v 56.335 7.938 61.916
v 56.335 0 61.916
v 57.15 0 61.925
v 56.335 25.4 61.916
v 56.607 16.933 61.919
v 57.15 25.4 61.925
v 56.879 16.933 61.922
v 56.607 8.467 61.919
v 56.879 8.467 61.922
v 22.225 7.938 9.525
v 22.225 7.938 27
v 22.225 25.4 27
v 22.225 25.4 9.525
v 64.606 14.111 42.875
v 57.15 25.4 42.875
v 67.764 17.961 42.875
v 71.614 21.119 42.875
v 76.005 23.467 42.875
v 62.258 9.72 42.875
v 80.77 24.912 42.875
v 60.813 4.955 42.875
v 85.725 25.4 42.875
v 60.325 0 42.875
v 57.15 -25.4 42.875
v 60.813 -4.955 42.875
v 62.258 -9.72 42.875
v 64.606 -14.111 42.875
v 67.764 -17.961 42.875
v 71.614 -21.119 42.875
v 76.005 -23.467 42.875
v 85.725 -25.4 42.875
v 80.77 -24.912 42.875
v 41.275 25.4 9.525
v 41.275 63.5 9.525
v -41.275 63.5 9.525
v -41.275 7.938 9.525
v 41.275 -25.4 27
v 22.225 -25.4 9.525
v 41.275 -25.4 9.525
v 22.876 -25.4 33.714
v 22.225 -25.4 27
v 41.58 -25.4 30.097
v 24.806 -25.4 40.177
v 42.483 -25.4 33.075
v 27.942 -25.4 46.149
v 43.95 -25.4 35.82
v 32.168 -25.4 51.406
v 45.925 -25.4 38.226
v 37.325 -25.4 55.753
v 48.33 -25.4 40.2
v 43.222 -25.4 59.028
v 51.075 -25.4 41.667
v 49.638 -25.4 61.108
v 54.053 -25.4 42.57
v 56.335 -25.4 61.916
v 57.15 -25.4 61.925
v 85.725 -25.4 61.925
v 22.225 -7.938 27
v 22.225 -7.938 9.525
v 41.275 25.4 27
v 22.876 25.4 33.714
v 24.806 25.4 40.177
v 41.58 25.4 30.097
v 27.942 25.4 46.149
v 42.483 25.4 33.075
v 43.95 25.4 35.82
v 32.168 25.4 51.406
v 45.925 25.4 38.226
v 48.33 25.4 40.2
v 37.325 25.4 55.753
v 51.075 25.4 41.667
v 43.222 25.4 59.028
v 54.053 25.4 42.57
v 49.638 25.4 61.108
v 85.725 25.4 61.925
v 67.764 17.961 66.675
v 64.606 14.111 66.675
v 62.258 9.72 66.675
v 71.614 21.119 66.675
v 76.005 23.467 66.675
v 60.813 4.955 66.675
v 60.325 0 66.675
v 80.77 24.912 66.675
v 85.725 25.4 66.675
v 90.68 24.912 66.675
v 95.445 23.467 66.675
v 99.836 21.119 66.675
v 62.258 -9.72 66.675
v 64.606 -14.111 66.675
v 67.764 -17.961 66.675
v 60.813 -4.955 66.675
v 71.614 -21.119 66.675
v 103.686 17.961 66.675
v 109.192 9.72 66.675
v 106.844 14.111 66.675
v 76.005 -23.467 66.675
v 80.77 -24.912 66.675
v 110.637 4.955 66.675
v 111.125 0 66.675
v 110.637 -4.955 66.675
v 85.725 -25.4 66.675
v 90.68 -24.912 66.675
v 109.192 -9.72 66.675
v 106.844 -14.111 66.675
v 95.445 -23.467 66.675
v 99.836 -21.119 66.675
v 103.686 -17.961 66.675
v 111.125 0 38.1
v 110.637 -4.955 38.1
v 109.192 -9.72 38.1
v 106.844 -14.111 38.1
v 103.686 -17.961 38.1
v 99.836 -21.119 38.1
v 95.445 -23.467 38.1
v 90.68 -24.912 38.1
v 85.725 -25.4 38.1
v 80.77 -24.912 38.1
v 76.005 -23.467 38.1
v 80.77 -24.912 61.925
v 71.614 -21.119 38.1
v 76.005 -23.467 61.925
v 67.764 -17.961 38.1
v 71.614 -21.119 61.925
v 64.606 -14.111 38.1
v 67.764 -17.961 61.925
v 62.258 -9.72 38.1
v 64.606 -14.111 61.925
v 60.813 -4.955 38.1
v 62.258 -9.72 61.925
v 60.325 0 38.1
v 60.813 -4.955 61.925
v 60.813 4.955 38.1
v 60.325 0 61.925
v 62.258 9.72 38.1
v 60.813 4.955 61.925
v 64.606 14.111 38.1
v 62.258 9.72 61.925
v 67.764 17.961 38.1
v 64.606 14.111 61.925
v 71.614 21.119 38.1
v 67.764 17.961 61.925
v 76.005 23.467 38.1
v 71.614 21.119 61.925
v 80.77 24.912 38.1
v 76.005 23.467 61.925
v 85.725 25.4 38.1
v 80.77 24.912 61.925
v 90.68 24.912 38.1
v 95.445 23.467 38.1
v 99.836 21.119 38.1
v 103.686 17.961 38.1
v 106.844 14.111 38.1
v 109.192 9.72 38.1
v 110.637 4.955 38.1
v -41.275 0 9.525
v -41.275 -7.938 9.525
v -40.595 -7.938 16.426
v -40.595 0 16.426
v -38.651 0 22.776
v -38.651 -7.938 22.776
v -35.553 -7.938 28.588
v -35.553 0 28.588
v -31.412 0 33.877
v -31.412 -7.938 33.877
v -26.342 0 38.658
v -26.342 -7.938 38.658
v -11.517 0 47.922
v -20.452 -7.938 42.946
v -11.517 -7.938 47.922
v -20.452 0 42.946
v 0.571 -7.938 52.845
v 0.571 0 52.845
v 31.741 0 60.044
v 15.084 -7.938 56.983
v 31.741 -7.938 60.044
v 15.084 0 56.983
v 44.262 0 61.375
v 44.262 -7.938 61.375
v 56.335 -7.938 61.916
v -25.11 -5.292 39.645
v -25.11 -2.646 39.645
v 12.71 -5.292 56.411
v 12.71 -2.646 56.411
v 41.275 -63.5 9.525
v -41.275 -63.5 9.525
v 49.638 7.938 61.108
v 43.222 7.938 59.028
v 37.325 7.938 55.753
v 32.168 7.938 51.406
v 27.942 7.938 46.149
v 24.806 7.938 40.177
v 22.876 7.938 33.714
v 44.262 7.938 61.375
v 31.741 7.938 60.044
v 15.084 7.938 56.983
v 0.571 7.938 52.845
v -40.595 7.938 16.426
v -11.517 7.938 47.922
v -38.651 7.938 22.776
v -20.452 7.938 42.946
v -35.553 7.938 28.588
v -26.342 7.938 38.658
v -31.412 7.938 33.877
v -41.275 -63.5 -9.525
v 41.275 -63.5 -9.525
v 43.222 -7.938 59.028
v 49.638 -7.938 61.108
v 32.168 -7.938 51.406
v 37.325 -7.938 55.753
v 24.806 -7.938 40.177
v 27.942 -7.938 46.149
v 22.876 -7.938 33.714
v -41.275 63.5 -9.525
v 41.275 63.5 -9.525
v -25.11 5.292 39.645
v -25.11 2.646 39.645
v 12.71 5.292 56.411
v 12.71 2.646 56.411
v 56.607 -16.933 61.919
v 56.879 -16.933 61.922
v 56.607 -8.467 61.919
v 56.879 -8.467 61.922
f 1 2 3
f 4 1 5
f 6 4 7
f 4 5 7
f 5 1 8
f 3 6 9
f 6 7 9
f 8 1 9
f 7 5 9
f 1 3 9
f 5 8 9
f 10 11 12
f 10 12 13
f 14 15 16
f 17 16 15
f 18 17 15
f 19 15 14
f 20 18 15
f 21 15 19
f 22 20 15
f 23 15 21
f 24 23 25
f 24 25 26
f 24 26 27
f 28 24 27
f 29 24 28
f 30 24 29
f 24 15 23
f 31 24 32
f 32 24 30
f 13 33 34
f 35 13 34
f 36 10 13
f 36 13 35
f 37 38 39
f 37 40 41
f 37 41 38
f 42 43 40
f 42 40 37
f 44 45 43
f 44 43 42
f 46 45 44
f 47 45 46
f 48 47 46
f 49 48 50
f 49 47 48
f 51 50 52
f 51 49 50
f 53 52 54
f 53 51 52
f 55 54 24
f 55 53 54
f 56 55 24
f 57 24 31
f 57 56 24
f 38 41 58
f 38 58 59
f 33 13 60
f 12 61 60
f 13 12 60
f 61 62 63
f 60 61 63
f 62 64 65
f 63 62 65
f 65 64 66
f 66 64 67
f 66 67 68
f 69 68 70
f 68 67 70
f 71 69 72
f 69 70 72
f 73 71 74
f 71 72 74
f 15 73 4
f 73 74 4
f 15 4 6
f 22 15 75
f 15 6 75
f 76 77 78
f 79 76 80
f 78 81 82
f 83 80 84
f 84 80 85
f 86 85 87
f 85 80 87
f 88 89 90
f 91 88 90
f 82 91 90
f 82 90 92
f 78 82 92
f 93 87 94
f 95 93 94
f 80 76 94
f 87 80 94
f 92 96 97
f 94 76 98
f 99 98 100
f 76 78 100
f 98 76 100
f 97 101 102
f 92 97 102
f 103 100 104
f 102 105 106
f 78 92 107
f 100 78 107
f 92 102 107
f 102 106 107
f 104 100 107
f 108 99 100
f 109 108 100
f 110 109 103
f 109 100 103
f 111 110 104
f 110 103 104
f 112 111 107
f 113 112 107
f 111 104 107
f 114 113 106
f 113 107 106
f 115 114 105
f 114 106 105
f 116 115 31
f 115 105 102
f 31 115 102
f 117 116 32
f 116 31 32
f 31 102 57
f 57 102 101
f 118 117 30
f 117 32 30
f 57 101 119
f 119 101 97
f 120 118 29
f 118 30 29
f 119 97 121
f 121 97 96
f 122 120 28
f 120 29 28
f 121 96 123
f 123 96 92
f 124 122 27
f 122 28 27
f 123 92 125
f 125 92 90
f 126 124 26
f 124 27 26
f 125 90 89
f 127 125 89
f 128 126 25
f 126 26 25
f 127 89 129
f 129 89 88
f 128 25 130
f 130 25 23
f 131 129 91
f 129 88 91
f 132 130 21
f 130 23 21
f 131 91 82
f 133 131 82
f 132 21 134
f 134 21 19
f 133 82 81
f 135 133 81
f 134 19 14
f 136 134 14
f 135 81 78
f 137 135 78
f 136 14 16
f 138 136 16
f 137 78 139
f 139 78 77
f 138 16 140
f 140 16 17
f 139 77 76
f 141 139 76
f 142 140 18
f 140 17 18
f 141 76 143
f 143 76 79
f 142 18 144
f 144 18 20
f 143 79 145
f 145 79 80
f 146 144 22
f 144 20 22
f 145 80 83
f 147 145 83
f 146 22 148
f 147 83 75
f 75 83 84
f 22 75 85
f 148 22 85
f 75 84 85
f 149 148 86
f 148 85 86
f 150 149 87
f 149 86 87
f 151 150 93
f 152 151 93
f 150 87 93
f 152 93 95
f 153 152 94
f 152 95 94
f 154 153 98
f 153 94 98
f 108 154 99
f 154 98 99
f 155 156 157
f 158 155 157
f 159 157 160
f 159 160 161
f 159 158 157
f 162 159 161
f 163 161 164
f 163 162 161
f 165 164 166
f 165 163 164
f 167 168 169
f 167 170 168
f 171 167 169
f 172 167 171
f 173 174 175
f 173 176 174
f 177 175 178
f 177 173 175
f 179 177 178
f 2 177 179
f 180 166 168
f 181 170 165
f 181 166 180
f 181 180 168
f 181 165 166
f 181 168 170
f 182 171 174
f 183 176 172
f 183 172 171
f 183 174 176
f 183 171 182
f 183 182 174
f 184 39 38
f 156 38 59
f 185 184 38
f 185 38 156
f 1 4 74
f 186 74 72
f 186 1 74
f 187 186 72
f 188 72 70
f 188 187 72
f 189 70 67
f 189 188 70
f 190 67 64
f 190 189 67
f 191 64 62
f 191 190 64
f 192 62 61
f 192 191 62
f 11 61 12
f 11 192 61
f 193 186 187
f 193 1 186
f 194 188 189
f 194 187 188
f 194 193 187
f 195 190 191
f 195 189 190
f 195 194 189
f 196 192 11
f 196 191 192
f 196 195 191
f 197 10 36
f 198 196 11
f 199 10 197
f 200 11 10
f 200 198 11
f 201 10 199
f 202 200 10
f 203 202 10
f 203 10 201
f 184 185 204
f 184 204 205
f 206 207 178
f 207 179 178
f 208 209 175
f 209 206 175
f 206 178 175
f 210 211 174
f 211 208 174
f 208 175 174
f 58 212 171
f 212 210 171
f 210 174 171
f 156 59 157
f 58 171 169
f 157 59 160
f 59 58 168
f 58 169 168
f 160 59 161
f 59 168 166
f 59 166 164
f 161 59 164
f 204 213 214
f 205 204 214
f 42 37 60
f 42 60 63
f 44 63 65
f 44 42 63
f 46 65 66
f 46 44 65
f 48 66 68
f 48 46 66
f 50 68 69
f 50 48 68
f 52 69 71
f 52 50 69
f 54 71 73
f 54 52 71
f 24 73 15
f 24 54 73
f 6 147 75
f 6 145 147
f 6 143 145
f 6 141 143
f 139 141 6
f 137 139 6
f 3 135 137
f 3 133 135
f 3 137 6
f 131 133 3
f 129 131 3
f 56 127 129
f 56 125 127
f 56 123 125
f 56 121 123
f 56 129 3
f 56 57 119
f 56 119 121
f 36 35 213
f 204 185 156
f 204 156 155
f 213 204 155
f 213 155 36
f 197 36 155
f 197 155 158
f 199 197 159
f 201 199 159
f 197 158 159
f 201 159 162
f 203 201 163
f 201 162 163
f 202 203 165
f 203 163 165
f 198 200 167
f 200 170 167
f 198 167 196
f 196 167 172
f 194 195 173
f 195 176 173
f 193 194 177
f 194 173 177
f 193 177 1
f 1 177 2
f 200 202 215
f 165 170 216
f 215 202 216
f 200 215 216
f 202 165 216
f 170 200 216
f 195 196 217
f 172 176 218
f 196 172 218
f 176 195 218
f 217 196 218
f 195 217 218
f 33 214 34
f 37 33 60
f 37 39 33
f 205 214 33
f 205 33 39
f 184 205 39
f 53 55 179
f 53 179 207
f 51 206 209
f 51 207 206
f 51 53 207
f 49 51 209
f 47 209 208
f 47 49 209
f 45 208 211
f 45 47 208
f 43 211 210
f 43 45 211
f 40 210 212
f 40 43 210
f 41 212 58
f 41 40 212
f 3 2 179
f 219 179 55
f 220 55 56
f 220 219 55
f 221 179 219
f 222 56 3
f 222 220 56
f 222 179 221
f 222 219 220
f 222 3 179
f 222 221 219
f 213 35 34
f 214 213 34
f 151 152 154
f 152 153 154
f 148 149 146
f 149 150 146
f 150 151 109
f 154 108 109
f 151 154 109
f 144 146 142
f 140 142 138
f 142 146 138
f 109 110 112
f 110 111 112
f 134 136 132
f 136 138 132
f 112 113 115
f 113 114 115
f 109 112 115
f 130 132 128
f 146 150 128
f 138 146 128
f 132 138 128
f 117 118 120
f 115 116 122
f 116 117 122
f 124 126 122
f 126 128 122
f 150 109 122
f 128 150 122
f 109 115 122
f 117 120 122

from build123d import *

# Parameters (mm, degrees)
F1_DEPTH = 63.5
F2_DEPTH = 25.4
F3_DEPTH = 7.9375


with BuildPart() as f1:
    # F0 (on Front) → F1 (new body, symmetric)
    with BuildSketch(Plane.XZ):
        Polygon((-41.275, 9.525), (-41.275, -9.525), (41.275, -9.525), (41.275, 9.525), (22.225, 9.525), align=None)
    extrude(amount=F1_DEPTH, both=True)

    # F0 (on Front) → F2 (join, symmetric)
    with BuildSketch(Plane.XZ):
        with BuildLine():
            Line((22.225, 9.525), (41.275, 9.525))
            Line((41.275, 9.525), (41.275, 27.0002))
            ThreePointArc((41.275, 27.0002), (45.92468, 38.22552), (57.15, 42.8752))
            Line((57.15, 42.8752), (60.325, 42.8752))
            Line((60.325, 42.8752), (60.325, 61.9252))
            Line((60.325, 61.9252), (57.15, 61.9252))
            add(Edge.make_bspline(
                [(56.334677, 61.915682), (56.607115, 61.919454), (56.878897, 61.922626), (57.15, 61.9252)],
                knots=[110.772816, 110.772816, 110.772816, 110.772816, 111.504536, 111.504536, 111.504536, 111.504536], degree=3))
            ThreePointArc((56.334677, 61.915682), (32.167698, 51.405942), (22.225, 27.0002))
            Line((22.225, 27.0002), (22.225, 9.525))
        make_face()
        Polygon((85.725, 61.9252), (60.325, 61.9252), (60.325, 42.8752), (85.725, 42.8752), (85.725, 52.3875), align=None)
    extrude(amount=F2_DEPTH, both=True)

    # F0 (on Front) → F3 (join, symmetric)
    with BuildSketch(Plane.XZ):
        with BuildLine():
            add(Edge.make_bspline(
                [(-41.275, 9.525), (-41.221754, 47.019336), (15.091041, 61.344656), (56.334677, 61.915682)],
                knots=[0, 0, 0, 0, 110.772816, 110.772816, 110.772816, 110.772816], degree=3))
            Line((-41.275, 9.525), (22.225, 9.525))
            Line((22.225, 9.525), (22.225, 27.0002))
            ThreePointArc((22.225, 27.0002), (32.167698, 51.405942), (56.334677, 61.915682))
        make_face()
    extrude(amount=F3_DEPTH, both=True)

    # F0 (on Front) → F4 (revolve)
    with BuildSketch(Plane.XZ):
        Polygon((85.725, 66.675), (85.725, 61.9252), (85.725, 52.3875), (85.725, 42.8752), (85.725, 38.1), (111.125, 38.1), (111.125, 66.675), align=None)
    revolve(axis=Axis((85.725, 0, 45.24375), (0, 0, -1)))


solid = f1.part
